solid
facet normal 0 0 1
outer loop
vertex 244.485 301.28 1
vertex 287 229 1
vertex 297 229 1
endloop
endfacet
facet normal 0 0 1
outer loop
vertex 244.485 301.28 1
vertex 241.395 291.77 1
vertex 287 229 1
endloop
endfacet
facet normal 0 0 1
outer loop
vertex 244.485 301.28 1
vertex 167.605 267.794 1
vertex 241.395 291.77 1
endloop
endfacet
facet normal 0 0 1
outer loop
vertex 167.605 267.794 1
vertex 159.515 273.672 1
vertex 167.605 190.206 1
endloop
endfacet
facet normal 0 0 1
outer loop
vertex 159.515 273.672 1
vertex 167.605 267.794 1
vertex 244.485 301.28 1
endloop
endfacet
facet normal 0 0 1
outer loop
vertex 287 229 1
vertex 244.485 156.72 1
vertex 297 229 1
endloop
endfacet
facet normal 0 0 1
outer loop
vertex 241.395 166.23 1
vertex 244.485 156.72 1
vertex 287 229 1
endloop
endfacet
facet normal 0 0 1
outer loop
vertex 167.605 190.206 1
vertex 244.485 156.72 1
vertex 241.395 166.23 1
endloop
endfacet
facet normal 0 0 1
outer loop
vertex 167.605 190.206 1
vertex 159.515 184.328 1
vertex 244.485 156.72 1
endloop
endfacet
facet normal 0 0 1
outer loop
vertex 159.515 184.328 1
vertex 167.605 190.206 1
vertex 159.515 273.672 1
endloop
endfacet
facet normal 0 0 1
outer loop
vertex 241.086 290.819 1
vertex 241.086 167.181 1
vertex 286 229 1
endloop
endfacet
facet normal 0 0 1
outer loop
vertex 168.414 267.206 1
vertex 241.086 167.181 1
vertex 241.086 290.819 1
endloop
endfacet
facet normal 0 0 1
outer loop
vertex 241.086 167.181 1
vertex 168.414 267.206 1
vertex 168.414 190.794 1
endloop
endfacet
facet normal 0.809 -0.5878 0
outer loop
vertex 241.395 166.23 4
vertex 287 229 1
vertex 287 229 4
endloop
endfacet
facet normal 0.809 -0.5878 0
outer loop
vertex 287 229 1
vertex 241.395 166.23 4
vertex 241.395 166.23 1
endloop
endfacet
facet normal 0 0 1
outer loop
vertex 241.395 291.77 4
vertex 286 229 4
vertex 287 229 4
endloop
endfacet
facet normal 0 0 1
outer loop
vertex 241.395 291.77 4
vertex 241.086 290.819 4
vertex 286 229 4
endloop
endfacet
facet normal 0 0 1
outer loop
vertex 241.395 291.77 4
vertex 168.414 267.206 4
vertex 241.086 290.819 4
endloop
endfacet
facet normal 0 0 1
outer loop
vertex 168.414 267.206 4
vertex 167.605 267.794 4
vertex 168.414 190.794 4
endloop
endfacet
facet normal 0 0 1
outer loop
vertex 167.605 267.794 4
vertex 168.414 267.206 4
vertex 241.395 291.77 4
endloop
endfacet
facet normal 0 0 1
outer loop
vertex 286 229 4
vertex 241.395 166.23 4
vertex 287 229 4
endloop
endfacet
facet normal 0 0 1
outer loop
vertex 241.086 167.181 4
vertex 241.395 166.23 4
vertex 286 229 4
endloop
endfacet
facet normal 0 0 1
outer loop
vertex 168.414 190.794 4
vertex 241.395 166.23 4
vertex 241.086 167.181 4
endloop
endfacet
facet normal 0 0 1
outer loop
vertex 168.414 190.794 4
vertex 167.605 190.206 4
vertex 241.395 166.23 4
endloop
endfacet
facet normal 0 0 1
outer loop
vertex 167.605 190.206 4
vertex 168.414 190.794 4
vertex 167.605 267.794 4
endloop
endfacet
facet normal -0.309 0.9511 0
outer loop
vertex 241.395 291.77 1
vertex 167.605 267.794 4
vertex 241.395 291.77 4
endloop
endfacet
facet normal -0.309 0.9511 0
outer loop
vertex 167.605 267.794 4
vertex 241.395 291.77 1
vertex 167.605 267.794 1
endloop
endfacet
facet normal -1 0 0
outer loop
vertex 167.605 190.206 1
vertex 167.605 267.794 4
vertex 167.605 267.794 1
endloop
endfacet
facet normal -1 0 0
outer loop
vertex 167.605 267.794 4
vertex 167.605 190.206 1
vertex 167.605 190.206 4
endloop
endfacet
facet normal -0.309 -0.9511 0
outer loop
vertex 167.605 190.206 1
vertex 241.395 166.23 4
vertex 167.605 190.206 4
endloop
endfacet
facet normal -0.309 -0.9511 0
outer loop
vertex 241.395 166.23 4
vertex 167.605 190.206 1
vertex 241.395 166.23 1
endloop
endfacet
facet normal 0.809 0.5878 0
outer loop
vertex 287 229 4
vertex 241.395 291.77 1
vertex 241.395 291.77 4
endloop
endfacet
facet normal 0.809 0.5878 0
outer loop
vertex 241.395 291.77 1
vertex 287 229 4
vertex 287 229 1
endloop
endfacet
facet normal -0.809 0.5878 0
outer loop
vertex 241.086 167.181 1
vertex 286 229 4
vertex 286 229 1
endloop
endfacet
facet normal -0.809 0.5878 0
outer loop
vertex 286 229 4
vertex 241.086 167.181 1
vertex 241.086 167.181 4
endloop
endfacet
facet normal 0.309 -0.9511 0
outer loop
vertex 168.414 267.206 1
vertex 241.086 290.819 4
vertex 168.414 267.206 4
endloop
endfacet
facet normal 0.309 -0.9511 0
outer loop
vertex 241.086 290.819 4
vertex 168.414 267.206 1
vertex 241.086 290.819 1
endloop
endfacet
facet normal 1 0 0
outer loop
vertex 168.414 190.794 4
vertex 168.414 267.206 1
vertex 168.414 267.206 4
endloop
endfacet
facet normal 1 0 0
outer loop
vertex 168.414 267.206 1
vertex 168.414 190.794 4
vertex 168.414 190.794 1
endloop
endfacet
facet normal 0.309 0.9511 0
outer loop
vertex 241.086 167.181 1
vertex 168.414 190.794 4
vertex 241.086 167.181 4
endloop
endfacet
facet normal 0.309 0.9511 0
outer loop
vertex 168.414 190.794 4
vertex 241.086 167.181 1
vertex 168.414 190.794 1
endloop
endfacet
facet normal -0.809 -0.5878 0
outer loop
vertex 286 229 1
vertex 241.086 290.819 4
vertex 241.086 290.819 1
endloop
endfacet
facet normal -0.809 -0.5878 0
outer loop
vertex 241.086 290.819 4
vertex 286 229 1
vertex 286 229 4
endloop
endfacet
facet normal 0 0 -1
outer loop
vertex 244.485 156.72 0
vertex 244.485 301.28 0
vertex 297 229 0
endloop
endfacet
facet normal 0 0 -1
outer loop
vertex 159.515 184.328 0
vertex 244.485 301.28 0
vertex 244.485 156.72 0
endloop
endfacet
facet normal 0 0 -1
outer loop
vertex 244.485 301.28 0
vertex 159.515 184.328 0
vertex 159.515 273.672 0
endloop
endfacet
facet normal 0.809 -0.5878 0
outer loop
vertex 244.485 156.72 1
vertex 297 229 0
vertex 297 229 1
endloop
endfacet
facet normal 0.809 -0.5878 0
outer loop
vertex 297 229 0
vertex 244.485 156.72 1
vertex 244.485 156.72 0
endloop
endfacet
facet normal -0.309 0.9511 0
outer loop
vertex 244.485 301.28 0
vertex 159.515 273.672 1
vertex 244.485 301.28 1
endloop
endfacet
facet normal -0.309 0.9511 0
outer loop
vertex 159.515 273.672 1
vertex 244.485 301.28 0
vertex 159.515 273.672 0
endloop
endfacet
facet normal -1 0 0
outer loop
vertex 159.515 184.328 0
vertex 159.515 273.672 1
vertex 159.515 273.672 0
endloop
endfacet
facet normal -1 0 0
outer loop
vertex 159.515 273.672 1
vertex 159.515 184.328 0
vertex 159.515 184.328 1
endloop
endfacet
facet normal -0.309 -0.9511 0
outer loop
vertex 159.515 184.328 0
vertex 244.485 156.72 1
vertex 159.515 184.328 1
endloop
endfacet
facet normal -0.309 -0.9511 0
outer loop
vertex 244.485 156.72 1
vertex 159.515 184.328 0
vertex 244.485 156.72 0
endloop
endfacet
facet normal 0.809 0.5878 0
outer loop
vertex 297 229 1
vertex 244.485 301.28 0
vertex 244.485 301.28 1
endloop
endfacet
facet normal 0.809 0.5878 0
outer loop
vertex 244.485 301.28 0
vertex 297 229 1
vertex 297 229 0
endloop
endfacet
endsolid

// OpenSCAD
//import("DodecahedronTerarium_split_top.stl");


translate([221,229,0]){
    color("red")
    linear_extrude(height=1)
    circle(r=76, $fn=5);
}

difference(){
    translate([221,229,1]){
        color("blue")
        linear_extrude(height=3)
        circle(r=66, $fn=5);
    }


    translate([221,229,.9]){
        color("blue")
        linear_extrude(height=3.2)
        circle(r=65, $fn=5);
    }
}
